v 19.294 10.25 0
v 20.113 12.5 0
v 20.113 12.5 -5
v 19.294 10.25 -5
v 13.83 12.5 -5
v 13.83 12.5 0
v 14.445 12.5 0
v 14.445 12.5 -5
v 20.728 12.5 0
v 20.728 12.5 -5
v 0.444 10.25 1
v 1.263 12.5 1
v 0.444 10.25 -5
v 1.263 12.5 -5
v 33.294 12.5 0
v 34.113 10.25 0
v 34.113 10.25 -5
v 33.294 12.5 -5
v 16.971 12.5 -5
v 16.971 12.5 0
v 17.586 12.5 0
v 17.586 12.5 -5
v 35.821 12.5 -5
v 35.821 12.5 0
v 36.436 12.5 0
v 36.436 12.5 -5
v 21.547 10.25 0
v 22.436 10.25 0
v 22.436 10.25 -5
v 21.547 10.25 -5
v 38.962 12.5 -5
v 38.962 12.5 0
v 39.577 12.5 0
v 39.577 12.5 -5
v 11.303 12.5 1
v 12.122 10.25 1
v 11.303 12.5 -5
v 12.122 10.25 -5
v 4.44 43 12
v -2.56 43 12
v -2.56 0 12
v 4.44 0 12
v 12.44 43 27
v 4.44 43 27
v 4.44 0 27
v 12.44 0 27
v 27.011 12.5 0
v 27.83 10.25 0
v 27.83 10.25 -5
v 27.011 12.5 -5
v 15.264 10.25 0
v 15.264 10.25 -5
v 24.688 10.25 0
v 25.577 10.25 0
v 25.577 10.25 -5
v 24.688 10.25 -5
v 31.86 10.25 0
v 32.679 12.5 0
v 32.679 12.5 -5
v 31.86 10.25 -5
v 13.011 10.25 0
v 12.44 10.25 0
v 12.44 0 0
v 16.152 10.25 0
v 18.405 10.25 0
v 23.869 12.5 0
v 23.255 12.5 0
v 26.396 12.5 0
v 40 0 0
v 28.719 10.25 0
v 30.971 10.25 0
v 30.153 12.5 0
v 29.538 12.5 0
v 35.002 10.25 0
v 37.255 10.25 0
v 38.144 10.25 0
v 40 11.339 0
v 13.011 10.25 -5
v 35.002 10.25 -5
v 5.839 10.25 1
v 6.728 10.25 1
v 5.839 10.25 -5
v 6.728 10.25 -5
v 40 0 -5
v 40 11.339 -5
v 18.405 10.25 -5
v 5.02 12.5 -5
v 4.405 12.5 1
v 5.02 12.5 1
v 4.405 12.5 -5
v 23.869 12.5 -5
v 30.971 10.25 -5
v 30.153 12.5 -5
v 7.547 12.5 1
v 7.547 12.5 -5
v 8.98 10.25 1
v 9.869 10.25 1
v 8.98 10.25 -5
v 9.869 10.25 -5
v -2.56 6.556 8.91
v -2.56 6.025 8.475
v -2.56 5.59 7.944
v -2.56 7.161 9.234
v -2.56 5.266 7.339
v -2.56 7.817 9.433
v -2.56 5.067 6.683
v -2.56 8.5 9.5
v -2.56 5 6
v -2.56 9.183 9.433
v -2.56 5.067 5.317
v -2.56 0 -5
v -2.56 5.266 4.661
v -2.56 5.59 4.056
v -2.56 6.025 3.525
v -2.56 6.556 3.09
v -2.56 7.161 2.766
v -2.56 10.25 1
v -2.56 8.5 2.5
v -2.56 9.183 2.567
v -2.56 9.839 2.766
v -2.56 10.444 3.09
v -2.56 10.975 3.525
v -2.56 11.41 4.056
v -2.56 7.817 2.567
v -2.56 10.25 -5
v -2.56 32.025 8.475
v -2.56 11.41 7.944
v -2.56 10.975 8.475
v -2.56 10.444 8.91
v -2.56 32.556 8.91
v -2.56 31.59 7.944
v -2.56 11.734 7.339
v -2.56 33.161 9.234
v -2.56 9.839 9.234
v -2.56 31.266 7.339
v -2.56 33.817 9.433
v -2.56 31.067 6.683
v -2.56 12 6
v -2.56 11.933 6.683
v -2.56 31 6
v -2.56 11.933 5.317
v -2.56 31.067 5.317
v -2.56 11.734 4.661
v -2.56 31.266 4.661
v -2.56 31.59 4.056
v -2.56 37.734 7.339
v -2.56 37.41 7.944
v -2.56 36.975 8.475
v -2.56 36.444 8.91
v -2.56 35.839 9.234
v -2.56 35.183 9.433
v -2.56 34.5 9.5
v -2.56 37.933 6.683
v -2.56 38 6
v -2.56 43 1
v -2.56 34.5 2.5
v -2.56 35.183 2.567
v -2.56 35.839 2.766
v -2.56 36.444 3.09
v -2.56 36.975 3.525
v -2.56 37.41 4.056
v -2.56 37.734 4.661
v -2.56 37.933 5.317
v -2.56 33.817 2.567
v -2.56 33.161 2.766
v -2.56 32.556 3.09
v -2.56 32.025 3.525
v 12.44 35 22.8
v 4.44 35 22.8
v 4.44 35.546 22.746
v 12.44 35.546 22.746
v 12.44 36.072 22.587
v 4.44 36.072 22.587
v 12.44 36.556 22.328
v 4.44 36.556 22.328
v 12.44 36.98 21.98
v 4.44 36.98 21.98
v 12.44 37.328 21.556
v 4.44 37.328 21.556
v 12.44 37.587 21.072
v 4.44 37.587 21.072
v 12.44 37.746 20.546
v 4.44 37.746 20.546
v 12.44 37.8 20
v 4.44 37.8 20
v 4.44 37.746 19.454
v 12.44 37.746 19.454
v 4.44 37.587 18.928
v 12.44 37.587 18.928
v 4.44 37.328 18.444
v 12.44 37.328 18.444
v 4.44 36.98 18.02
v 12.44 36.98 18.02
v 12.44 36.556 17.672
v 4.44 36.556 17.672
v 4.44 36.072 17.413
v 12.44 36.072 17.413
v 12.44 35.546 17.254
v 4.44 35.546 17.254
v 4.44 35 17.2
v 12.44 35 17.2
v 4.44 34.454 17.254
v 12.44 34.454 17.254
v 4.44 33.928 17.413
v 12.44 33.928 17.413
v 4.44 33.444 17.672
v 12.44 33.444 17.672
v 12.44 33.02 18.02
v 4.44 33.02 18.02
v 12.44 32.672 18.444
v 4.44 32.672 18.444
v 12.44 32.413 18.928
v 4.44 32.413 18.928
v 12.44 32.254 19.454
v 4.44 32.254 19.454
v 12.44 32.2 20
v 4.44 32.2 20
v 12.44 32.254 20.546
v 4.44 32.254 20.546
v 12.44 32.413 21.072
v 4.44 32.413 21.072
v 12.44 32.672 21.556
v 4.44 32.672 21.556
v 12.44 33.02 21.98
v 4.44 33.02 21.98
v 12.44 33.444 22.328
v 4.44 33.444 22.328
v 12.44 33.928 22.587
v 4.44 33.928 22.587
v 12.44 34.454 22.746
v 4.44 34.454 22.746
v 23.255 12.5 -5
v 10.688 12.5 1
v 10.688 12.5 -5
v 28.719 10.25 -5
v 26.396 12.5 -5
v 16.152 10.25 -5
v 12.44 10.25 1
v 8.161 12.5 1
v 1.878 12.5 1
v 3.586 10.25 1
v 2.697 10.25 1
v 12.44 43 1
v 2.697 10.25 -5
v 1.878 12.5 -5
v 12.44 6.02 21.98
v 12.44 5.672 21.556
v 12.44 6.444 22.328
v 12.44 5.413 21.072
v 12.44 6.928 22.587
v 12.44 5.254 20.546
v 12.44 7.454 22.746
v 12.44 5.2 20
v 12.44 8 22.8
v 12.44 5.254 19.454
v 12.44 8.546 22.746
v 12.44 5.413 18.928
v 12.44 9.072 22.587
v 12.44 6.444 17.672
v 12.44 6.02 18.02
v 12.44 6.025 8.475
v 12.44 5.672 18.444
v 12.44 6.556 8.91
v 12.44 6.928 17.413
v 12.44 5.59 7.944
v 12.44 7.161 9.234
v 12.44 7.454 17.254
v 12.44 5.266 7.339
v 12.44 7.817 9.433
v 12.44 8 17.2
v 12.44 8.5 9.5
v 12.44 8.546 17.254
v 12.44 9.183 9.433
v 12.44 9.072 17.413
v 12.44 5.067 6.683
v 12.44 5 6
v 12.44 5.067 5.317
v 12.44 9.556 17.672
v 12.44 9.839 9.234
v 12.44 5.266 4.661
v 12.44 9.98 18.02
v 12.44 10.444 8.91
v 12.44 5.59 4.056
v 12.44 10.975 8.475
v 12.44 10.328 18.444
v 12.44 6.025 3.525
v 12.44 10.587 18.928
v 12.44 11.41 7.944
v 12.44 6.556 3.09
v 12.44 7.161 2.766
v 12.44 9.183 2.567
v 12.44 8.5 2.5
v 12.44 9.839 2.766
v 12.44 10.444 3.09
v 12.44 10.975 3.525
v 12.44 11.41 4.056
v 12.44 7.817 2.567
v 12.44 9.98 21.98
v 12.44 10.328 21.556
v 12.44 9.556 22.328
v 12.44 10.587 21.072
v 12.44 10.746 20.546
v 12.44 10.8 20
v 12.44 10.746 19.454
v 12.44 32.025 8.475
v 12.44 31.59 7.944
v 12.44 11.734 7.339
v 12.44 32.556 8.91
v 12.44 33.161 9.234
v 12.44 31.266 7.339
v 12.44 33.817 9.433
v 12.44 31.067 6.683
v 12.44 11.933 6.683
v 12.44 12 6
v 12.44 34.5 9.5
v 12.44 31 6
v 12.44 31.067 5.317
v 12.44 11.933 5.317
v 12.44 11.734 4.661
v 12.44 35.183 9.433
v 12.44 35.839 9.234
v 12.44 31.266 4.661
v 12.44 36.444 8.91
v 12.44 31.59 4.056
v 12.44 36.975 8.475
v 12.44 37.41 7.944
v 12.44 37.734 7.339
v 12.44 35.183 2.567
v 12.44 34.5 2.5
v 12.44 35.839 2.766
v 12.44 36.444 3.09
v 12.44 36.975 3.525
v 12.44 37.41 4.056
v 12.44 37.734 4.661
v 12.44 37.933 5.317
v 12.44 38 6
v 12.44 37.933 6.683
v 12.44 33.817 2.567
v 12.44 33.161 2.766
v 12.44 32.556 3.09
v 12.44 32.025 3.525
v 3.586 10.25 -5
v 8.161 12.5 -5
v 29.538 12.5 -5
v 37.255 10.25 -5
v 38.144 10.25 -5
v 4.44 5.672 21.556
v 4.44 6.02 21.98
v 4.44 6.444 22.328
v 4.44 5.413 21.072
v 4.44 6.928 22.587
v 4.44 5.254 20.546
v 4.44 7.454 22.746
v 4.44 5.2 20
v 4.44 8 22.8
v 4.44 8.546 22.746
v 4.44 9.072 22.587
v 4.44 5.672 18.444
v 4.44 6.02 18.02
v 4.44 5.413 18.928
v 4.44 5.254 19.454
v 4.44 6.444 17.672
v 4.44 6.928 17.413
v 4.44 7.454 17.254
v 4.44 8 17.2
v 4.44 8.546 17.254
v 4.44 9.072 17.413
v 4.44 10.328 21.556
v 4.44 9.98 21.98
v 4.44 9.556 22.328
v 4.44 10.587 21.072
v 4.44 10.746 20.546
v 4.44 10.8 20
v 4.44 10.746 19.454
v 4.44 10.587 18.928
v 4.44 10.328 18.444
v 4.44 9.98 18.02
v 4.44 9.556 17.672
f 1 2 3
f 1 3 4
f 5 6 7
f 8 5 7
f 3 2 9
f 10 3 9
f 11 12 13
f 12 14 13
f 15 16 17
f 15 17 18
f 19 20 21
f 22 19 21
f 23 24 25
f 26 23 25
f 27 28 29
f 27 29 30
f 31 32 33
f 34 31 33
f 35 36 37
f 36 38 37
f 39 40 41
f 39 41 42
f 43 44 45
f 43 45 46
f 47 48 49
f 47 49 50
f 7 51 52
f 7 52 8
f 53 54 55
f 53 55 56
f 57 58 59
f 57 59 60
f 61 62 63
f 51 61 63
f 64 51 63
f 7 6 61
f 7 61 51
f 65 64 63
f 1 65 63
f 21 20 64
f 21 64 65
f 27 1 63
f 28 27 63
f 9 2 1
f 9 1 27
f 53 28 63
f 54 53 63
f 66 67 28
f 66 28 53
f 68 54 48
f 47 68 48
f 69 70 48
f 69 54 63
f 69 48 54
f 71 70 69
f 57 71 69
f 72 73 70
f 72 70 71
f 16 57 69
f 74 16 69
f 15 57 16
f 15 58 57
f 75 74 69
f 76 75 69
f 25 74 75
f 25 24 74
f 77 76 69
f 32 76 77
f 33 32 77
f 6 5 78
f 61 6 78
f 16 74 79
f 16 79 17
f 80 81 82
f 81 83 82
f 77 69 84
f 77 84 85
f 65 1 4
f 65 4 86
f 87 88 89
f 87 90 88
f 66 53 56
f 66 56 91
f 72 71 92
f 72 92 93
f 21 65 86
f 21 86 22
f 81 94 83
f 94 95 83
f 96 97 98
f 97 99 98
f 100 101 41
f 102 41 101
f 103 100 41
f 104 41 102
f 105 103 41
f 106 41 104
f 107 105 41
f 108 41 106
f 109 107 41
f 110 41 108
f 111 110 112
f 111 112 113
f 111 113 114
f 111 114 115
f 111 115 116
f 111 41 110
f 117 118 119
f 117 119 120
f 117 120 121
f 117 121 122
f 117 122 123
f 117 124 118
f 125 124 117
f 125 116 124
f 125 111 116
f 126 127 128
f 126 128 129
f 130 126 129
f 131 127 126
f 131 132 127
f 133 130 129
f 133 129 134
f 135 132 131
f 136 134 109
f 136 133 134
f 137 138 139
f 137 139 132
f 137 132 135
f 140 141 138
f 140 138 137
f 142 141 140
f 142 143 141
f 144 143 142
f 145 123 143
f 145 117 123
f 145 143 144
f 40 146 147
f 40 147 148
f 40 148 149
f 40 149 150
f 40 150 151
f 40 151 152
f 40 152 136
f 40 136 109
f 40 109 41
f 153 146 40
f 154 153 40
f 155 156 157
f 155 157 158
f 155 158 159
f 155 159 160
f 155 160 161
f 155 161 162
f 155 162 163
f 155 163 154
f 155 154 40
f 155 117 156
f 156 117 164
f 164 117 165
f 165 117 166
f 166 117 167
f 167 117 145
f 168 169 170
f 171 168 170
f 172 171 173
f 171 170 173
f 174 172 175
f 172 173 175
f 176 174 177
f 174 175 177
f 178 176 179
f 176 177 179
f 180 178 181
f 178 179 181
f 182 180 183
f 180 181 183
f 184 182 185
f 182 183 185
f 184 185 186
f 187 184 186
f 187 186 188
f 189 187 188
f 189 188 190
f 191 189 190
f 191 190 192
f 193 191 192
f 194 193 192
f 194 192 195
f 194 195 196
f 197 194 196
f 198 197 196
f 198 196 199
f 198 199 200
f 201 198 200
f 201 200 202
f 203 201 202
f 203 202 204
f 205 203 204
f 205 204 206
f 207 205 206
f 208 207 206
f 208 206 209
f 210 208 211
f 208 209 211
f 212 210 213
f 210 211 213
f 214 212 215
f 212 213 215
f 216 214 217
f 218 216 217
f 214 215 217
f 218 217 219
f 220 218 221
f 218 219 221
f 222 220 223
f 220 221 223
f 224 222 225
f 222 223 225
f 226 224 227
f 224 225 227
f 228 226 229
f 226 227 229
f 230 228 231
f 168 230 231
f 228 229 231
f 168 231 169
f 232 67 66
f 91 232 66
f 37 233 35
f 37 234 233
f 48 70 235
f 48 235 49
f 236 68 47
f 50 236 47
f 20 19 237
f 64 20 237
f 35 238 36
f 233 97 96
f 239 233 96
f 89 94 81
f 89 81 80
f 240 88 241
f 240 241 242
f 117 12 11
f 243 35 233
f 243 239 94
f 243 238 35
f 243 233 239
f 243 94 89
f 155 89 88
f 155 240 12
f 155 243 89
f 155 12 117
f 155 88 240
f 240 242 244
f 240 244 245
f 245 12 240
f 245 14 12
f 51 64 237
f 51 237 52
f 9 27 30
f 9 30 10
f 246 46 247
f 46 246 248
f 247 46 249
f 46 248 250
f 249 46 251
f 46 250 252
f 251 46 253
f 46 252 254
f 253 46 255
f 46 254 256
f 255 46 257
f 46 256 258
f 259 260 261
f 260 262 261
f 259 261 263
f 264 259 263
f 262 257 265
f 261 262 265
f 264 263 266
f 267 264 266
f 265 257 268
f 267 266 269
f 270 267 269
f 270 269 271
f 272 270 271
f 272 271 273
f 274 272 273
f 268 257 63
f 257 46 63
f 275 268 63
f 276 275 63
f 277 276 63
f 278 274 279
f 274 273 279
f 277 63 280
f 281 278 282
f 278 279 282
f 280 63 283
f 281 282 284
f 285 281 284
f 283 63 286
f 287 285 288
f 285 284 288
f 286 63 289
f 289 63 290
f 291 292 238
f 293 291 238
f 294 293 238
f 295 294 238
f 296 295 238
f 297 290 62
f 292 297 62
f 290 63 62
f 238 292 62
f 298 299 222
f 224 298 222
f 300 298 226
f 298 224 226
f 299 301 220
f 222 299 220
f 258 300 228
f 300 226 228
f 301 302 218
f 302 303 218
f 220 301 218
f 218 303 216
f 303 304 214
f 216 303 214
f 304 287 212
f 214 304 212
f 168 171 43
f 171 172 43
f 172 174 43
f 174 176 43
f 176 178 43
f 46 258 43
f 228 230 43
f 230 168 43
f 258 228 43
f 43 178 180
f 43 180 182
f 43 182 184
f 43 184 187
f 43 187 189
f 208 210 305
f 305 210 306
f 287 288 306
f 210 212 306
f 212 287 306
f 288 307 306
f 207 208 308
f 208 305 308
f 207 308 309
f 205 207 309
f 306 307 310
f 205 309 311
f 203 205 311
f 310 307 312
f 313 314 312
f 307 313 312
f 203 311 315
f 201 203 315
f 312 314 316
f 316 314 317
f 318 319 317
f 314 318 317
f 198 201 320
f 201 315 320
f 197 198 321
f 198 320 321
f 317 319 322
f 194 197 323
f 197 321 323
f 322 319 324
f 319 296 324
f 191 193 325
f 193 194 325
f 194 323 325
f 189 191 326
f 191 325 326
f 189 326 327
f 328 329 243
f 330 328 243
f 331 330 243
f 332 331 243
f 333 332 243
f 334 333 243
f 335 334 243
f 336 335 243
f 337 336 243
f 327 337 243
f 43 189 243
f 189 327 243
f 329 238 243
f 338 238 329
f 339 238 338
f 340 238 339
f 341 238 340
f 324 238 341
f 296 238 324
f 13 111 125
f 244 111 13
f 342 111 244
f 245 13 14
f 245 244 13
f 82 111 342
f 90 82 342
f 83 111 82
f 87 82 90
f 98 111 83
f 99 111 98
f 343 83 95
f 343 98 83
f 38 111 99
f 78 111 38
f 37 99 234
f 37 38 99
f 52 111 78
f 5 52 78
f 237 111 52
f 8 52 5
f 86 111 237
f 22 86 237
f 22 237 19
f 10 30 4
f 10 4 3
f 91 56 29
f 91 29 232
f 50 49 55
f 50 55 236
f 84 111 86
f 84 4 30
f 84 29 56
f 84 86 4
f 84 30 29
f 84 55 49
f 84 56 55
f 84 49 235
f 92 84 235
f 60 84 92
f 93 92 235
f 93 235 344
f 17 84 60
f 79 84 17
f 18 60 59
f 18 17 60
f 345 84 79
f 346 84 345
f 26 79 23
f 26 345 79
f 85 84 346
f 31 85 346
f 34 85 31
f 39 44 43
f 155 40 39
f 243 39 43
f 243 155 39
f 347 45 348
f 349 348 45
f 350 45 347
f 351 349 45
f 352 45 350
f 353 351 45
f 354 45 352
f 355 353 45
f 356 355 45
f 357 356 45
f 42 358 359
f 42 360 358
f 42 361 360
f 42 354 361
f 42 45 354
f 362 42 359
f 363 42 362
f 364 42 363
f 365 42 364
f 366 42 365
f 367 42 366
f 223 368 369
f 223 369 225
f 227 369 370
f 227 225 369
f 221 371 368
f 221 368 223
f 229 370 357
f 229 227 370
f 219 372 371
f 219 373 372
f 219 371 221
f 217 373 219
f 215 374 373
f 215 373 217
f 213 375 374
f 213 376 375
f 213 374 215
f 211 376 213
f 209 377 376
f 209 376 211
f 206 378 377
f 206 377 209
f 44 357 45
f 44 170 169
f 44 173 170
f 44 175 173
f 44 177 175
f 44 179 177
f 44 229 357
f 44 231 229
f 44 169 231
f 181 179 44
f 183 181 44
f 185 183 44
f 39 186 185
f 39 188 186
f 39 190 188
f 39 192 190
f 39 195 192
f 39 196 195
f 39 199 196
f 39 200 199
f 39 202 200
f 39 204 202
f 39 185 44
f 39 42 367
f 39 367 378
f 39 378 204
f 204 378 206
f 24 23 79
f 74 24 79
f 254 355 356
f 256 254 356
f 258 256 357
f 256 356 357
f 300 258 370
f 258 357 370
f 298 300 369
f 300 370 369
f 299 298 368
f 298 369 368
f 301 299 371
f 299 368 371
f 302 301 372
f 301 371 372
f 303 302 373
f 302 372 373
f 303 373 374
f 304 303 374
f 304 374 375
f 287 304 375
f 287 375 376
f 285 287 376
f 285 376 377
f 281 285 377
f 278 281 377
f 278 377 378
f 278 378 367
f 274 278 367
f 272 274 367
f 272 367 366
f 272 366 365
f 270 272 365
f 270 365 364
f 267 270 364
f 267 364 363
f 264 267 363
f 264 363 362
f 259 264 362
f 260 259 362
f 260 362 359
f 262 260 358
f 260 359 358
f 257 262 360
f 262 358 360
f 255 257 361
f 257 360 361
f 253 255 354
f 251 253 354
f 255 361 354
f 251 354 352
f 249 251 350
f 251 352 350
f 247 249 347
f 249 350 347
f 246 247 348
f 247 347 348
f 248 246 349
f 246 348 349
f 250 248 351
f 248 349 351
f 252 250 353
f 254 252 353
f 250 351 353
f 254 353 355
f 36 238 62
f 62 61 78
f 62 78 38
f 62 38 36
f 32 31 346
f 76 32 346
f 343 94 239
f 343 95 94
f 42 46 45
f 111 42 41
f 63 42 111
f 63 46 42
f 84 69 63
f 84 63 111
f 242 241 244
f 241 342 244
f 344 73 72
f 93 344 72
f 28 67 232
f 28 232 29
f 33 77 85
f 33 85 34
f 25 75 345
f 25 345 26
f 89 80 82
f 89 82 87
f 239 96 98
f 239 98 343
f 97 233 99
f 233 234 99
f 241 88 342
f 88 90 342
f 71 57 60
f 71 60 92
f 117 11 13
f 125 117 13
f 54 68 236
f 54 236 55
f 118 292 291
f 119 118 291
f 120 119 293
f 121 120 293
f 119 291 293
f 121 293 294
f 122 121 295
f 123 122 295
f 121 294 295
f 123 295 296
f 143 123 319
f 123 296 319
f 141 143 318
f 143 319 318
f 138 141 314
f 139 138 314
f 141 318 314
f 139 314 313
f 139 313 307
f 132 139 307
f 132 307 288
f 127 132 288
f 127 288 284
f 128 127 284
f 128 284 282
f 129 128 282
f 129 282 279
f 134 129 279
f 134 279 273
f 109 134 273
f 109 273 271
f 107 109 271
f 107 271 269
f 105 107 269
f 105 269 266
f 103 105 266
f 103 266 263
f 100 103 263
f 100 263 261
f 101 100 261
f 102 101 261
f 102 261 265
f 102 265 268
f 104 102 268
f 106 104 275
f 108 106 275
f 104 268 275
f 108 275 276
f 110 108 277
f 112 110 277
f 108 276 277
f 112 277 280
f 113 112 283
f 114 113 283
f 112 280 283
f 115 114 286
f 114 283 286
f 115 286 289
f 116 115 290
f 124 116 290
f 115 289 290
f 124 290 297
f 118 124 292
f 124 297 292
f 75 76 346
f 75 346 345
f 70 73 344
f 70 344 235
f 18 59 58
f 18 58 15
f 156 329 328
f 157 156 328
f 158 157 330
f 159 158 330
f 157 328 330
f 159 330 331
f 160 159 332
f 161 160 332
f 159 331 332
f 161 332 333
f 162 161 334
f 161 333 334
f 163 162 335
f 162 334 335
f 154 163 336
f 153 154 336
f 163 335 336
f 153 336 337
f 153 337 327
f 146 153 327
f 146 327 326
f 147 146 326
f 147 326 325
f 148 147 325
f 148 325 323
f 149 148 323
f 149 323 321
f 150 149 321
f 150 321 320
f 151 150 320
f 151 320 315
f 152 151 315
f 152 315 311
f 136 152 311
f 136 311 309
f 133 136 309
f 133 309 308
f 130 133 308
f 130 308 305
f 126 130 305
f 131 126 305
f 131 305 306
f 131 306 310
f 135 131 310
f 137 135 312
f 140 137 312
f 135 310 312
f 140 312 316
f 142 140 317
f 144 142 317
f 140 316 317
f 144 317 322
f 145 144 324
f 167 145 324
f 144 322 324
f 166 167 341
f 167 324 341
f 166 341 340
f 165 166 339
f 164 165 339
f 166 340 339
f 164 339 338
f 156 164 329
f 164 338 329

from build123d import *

# Parameters (mm, degrees)
BLANKSKE_W                 = 40
BLANKSKE_H                 = 12.5
BLANK_DEPTH                = 5
TOOTHCUTSIM_DEPTH          = 43.20485754
TEETHCUTS_COUNT            = 14
TEETHCUTS_PITCH            = 3.14159265
MOVE_FACE1_BY              = 0.44
SKETCH1_W                  = 15
SKETCH1_H                  = 43
BOSS_EXTRUDE1_DEPTH        = 12
F_7_0_7_DIAMETER_HOLE1_D   = 7
SKETCH6_W                  = 2.7
SKETCH6_H                  = 17
BOSS_EXTRUDE2_DEPTH        = 3.5
SKETCH7_W                  = 8
SKETCH7_H                  = 43
BOSS_EXTRUDE3_DEPTH        = 15
F_5_6_5_6_DIAMETER_HOLE1_D = 5.6
CUT_EXTRUDE1_START         = -17
SKETCH11_W                 = 15
SKETCH11_H                 = 3.5
CUT_EXTRUDE1_DEPTH         = 17
MOVE_FACE2_BY              = 1
MOVE_FACE3_BY              = 3


with BuildPart() as part:
    # BlankSke → Blank (new body)
    with BuildSketch(Plane.XY):
        with Locations((20, 6.25)):
            Rectangle(BLANKSKE_W, BLANKSKE_H)
    extrude(amount=-BLANK_DEPTH)

    # TooCutSkeSim → ToothCutSim (cut, through all)
    with BuildSketch(Plane.XY):
        Polygon((0.44443537, 10.25), (-0.44443537, 10.25), (-1.272613241, 12.5254), (1.272613241, 12.5254), align=None)
    toothcutsim = extrude(amount=-TOOTHCUTSIM_DEPTH, mode=Mode.SUBTRACT)

    # TeethCuts: ToothCutSim ×14
    with Locations(*[(i * TEETHCUTS_PITCH, 0, 0) for i in range(1, TEETHCUTS_COUNT)]):
        add(toothcutsim, mode=Mode.SUBTRACT)

    # Move Face1: a face moved inward by 0.44
    extrude(part.faces().sort_by_distance((0, 5.125, -2.5))[0], amount=MOVE_FACE1_BY, dir=(1, 0, 0), mode=Mode.SUBTRACT)

    # Sketch1 → Boss-Extrude1 (add)
    with BuildSketch(Plane(origin=(0, 0, 0), x_dir=(-1, 0, 0), z_dir=(0, 0, -1))):
        with Locations((-4.94, 21.5)):
            Rectangle(SKETCH1_W, SKETCH1_H)
    extrude(amount=-BOSS_EXTRUDE1_DEPTH)

    # Ø7.0 (7) Diameter Hole1 (through all)
    with Locations(Plane.ZY.offset(2.56)):
        with Locations((6, 34.5), (6, 8.5)):
            Hole(F_7_0_7_DIAMETER_HOLE1_D / 2)

    # Sketch6 → Boss-Extrude2 (add)
    with BuildSketch(Plane.XZ):
        with Locations((-1.21, 3.5)):
            Rectangle(SKETCH6_W, SKETCH6_H)
        with Locations((11.09, 3.5)):
            Rectangle(SKETCH6_W, SKETCH6_H)
    extrude(amount=BOSS_EXTRUDE2_DEPTH)

    # Sketch7 → Boss-Extrude3 (add)
    with BuildSketch(Plane.XY.offset(12)):
        with Locations((8.44, 21.5)):
            Rectangle(SKETCH7_W, SKETCH7_H)
    extrude(amount=BOSS_EXTRUDE3_DEPTH)

    # Ø5.6 (5.6) Diameter Hole1 (through all)
    with Locations(Plane(origin=(12.44, 0, 0), x_dir=(0, 0, -1), z_dir=(1, 0, 0))):
        with Locations((-20, 35), (-20, 8)):
            Hole(F_5_6_5_6_DIAMETER_HOLE1_D / 2)

    # Sketch11 → Cut-Extrude1 (cut)
    with BuildSketch(Plane.XY.offset(12).offset(CUT_EXTRUDE1_START)):
        with Locations((4.94, -1.75)):
            Rectangle(SKETCH11_W, SKETCH11_H)
    extrude(amount=CUT_EXTRUDE1_DEPTH, mode=Mode.SUBTRACT)

    # Move Face2: a face moved inward by 1.0
    extrude(part.faces().sort_by_distance((4.543546999, 25.718346506, 0))[0], amount=MOVE_FACE2_BY, dir=(0, 0, 1), mode=Mode.SUBTRACT)

    # Move Face3: a face moved outward by 3.0
    extrude(part.faces().sort_by_distance((0.44, 5.125, -2))[0], amount=MOVE_FACE3_BY, dir=(-1, 0, 0))


solid = part.part
